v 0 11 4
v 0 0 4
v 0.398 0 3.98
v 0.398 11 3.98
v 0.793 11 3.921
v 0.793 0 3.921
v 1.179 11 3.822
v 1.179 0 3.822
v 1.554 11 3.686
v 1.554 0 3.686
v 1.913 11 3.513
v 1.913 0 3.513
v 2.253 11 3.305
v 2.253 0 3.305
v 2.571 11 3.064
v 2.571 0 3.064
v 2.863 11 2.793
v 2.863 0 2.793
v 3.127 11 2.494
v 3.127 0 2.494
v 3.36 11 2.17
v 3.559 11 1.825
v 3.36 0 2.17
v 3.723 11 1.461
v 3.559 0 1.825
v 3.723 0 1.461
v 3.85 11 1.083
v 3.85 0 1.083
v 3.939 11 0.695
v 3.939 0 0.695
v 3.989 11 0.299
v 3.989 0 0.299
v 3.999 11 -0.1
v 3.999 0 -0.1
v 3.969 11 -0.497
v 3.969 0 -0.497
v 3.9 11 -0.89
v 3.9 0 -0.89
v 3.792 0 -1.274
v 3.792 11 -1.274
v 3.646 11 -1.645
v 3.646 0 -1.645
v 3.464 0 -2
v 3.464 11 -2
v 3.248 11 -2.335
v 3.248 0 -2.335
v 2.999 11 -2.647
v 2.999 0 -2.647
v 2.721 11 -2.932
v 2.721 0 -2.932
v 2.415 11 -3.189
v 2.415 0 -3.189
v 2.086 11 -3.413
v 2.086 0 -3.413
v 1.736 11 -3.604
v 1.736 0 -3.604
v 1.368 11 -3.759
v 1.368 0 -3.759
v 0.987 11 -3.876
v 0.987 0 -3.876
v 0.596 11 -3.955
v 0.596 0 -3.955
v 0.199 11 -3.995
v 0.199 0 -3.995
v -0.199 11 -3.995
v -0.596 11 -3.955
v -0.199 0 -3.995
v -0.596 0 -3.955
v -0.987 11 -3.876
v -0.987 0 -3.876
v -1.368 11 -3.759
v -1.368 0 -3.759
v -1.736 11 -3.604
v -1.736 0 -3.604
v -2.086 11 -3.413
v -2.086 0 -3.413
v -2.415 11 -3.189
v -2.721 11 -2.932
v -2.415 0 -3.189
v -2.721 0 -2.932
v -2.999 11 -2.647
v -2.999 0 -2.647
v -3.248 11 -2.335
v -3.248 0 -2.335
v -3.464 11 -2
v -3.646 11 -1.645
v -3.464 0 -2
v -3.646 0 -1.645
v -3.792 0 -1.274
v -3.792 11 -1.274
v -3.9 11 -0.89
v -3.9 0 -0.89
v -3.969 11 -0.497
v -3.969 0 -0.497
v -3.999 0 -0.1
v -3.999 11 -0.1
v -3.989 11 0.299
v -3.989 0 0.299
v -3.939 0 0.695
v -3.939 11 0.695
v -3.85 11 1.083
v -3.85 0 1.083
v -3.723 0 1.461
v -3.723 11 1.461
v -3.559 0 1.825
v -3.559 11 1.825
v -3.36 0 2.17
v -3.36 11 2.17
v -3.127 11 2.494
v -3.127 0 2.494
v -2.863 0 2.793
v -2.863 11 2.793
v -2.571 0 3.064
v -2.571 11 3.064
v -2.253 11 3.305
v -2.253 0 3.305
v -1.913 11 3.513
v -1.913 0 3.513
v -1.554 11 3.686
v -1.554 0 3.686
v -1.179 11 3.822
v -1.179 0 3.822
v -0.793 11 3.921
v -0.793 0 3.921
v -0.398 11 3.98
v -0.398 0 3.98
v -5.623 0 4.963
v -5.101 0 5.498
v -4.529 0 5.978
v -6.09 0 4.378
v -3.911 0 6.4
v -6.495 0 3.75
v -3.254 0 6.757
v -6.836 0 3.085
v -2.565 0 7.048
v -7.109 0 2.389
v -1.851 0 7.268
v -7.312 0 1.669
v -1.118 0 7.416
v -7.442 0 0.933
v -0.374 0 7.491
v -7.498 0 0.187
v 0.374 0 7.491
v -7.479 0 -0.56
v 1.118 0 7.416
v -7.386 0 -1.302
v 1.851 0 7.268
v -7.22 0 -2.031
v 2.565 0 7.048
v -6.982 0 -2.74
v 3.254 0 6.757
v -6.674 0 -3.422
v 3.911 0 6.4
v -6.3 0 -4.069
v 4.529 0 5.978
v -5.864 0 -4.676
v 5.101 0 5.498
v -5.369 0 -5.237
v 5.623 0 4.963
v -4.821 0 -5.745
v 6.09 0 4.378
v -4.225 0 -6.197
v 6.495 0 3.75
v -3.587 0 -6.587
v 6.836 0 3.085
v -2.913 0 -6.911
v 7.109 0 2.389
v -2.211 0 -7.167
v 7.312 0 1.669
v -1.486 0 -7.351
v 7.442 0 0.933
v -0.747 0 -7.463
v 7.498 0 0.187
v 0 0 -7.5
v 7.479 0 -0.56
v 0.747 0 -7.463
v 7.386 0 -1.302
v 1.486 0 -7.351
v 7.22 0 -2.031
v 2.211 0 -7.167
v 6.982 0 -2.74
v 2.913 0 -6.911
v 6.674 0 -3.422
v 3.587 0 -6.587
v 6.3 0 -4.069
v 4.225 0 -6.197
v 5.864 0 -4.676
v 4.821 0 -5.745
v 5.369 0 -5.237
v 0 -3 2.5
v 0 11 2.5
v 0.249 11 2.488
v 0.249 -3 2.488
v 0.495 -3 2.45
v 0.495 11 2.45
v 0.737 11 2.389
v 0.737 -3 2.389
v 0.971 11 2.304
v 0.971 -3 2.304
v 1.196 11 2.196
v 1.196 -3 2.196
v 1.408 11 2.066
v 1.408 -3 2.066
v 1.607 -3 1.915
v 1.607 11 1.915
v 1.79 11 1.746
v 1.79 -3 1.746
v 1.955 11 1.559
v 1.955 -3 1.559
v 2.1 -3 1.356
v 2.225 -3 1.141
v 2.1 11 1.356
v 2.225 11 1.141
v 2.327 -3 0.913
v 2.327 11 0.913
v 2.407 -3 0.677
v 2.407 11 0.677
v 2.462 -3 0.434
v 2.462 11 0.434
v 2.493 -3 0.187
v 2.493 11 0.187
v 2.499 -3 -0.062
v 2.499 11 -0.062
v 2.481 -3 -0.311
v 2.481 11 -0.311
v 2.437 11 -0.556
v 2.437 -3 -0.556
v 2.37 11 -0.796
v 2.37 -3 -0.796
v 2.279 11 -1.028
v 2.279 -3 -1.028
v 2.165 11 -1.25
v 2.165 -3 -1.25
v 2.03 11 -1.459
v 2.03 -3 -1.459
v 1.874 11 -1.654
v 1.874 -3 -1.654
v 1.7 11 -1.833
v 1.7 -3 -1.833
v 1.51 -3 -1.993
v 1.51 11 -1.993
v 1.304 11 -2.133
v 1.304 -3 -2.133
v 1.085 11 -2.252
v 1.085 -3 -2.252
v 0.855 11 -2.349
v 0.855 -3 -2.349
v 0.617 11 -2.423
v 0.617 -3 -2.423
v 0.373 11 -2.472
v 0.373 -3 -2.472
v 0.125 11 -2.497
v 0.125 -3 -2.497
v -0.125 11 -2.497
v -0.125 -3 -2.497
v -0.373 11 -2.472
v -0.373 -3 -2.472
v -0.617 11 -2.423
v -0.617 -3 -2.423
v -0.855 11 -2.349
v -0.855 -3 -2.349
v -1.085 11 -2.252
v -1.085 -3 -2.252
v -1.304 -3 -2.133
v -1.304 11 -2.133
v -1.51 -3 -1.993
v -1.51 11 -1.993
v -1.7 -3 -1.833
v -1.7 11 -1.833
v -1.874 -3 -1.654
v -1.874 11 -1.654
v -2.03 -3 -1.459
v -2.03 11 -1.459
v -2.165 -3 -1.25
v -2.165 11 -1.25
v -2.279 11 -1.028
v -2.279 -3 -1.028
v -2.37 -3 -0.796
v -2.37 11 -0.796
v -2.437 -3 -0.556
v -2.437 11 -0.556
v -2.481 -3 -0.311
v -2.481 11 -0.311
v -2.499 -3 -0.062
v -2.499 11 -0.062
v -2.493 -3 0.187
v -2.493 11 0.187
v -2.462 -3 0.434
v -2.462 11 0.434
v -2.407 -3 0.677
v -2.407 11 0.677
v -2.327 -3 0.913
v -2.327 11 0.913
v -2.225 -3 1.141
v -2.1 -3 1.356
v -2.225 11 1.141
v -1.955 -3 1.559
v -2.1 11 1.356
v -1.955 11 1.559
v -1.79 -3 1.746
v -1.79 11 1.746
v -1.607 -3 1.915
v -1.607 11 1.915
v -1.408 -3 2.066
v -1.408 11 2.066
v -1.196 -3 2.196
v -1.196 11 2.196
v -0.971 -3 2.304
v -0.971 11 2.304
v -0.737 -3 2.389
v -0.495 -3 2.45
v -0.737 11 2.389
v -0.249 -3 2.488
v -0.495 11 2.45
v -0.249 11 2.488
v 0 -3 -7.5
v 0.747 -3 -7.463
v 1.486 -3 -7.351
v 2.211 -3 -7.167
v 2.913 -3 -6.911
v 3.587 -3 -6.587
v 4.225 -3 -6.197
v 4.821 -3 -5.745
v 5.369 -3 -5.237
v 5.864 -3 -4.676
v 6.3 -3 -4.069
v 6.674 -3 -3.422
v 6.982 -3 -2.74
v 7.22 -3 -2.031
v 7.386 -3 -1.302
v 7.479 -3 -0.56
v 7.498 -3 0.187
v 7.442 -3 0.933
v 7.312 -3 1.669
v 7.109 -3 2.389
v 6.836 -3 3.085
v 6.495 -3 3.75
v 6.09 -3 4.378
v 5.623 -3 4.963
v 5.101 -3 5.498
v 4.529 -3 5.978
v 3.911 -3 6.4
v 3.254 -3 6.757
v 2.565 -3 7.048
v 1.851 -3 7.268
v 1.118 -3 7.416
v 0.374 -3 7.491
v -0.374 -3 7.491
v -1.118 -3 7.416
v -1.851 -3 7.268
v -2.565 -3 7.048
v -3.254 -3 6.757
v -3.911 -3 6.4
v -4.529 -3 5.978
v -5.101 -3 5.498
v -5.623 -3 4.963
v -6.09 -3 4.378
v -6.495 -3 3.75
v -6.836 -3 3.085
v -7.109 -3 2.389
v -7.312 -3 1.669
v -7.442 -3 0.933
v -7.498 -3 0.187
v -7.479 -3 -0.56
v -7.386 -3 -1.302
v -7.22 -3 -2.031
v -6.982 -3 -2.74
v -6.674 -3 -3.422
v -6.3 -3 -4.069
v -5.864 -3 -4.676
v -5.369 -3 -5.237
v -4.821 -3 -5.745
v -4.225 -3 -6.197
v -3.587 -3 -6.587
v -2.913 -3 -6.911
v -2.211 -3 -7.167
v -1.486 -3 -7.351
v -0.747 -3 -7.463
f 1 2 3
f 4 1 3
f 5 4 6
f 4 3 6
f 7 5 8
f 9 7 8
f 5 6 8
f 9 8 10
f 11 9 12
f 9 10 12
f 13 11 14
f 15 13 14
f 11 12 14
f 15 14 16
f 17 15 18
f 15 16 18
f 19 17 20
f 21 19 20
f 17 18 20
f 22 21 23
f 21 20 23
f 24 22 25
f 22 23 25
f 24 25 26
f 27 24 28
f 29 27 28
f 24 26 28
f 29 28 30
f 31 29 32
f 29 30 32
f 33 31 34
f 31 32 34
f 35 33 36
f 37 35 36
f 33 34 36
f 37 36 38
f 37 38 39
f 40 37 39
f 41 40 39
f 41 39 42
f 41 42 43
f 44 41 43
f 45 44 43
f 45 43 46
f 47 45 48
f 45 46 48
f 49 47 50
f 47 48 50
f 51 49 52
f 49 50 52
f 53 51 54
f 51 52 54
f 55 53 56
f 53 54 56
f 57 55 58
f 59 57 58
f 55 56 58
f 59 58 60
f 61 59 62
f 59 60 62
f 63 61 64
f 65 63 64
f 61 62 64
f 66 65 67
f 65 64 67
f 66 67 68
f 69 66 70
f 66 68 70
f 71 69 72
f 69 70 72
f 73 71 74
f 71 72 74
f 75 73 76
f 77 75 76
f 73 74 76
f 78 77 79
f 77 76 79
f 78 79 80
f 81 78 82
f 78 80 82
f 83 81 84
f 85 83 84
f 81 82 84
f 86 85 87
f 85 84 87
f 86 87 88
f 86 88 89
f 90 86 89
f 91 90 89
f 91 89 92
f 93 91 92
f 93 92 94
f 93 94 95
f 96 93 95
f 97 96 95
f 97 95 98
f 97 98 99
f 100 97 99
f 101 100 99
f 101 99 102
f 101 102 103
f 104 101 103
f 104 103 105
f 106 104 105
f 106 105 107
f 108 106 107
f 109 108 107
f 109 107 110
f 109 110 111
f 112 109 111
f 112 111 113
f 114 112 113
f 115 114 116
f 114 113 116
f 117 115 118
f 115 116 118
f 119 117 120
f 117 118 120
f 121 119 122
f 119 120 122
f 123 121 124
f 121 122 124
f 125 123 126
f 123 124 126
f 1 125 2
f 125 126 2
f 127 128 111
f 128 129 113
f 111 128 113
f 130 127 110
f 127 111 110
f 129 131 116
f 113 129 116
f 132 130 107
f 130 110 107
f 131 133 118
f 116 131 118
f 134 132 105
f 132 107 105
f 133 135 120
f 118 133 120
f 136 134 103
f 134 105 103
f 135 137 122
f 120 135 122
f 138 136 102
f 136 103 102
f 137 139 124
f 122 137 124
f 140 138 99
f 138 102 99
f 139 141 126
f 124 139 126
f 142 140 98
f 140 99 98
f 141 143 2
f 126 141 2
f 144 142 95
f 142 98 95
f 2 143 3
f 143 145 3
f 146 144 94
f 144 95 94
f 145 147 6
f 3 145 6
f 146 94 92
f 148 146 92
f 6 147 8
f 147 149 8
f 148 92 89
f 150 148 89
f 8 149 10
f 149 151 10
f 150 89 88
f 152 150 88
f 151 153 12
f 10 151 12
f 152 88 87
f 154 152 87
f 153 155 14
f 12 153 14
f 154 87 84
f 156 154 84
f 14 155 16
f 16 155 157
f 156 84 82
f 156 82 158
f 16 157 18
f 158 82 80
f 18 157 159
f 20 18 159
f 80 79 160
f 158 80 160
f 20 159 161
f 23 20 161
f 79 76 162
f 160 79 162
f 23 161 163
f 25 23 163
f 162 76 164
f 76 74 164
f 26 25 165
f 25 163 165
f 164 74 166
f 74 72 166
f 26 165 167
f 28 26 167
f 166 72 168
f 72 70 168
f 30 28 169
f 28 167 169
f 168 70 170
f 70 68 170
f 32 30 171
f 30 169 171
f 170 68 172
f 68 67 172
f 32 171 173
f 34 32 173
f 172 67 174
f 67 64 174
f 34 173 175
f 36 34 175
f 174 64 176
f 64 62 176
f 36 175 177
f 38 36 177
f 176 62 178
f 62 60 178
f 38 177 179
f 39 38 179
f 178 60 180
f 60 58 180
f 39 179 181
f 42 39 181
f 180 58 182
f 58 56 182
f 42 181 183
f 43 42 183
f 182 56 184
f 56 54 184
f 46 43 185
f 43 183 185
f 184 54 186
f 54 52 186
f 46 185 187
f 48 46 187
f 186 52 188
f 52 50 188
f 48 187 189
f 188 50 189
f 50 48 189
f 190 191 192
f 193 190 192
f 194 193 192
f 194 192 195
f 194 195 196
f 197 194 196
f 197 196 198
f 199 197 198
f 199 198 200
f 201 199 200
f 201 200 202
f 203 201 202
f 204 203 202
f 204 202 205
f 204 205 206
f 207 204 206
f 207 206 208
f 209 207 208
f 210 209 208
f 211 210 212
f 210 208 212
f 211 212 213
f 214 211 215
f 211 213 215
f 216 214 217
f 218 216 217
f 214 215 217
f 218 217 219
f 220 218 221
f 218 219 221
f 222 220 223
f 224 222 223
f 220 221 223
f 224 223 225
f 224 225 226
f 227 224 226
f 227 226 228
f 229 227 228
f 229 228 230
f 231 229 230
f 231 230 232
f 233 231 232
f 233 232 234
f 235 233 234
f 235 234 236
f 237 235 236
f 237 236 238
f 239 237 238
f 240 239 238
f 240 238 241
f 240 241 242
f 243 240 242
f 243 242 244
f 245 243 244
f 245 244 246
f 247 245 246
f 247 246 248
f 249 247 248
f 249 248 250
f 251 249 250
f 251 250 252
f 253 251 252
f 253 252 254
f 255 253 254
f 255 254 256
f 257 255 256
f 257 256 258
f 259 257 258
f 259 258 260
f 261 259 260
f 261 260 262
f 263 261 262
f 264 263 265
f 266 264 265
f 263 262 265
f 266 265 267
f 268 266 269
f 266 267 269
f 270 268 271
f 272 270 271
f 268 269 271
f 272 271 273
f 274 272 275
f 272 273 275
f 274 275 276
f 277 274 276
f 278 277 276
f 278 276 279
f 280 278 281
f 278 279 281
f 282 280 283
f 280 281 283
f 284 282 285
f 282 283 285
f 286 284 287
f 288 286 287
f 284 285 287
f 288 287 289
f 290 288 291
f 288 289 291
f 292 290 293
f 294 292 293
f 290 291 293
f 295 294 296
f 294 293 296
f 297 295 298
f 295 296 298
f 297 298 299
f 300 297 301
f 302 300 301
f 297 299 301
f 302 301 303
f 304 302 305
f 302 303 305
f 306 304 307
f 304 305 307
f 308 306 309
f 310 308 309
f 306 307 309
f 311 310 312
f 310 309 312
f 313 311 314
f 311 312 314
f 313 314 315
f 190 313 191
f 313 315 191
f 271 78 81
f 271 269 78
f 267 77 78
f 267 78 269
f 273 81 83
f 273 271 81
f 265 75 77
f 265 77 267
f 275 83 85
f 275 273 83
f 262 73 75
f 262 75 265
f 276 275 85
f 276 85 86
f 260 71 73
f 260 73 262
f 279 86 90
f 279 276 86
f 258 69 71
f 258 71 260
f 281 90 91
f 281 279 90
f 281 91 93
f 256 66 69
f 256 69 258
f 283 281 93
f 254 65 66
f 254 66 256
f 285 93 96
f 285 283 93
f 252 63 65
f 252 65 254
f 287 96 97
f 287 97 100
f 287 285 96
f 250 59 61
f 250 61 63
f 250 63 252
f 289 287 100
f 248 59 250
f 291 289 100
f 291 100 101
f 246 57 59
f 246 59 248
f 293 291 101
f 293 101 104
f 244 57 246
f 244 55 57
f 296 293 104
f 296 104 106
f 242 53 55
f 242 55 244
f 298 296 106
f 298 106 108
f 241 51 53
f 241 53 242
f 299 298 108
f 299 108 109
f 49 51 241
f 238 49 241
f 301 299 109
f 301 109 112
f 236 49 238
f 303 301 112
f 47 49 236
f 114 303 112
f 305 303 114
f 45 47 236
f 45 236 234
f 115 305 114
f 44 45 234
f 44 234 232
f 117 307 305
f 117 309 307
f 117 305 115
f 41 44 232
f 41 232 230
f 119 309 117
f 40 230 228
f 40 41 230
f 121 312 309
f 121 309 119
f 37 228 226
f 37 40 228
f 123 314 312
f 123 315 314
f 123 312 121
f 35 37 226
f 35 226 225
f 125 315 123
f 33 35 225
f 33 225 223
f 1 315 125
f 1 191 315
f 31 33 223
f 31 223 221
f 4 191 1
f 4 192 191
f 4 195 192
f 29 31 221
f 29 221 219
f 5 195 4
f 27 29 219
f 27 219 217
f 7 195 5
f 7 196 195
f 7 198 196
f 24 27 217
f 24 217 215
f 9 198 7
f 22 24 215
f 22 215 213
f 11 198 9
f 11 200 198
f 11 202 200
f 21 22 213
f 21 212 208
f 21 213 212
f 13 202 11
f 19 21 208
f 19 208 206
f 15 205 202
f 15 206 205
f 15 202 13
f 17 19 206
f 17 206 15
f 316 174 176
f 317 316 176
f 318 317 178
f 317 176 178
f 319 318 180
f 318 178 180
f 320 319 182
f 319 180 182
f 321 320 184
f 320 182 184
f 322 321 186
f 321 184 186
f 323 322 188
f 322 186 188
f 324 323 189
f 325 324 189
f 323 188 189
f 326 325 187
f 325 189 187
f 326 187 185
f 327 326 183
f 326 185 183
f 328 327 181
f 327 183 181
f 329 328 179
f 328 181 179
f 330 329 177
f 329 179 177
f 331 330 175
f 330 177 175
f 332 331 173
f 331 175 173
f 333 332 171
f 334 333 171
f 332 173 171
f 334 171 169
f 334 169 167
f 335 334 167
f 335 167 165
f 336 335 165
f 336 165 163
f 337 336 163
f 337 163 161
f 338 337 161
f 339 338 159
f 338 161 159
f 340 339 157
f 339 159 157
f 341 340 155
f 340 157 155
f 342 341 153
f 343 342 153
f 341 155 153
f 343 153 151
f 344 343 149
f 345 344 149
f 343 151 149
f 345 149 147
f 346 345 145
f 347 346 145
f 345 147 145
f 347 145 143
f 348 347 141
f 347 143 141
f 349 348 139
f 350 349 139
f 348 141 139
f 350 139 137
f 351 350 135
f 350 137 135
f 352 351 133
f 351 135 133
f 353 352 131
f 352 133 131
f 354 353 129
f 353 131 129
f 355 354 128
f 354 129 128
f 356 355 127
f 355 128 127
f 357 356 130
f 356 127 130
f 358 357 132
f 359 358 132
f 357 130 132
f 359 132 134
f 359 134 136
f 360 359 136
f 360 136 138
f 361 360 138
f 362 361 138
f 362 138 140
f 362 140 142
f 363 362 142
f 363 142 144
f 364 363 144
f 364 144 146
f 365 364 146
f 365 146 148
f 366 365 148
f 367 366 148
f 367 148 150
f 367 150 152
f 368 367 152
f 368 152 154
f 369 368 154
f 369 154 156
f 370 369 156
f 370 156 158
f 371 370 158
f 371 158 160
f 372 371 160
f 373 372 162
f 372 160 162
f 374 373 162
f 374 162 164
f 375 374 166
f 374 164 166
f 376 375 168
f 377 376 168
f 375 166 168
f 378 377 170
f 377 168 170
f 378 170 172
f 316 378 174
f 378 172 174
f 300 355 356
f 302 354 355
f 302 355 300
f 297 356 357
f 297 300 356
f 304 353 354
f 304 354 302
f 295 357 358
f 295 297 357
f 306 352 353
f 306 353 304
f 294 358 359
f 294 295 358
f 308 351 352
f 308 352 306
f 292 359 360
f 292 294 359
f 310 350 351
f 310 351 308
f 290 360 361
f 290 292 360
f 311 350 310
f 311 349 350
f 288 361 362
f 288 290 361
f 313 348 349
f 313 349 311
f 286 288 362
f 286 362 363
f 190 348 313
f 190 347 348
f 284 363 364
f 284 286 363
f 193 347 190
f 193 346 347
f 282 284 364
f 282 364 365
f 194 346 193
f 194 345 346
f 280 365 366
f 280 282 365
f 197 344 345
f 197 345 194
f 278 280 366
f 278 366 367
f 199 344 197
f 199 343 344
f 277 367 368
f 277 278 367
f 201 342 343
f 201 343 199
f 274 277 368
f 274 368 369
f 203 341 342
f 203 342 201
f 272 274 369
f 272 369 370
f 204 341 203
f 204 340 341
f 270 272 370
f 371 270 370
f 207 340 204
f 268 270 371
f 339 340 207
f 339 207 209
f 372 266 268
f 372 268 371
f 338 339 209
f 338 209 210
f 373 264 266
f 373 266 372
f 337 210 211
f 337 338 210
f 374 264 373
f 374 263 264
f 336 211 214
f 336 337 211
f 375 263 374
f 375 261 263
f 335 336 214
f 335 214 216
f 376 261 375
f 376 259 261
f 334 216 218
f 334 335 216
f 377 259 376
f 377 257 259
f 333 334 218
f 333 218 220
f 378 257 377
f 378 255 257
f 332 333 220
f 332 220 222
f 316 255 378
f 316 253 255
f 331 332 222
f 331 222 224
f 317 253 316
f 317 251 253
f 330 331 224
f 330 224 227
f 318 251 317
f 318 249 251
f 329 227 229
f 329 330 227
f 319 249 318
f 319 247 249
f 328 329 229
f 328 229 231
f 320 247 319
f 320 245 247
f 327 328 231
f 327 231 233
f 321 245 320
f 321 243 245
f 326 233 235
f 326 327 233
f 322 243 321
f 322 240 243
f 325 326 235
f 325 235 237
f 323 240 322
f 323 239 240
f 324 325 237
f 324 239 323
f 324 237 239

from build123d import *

# Parameters (mm, degrees)
ESBO_O1_R                = 4
RESSALTO_EXTRUS_O1_DEPTH = 11
ESBO_O3_R                = 7.5
RESSALTO_EXTRUS_O3_DEPTH = 3
ESBO_O6_R                = 2.5
CORTE_EXTRUS_O1_DEPTH    = 18.56416807


with BuildPart() as part:
    # Esboço1 → Ressalto-extrusão1 (new body)
    with BuildSketch(Plane(origin=(0, 0, 0), x_dir=(1, 0, 0), z_dir=(0, 1, 0))):
        with Locations(Location((0, 0, 0), (0, 0, 270))):
            Circle(ESBO_O1_R)
    extrude(amount=RESSALTO_EXTRUS_O1_DEPTH)

    # Esboço3 → Ressalto-extrusão3 (add)
    with BuildSketch(Plane.XZ):
        with Locations(Location((0, 0, 0), (0, 0, 270))):
            Circle(ESBO_O3_R)
    extrude(amount=RESSALTO_EXTRUS_O3_DEPTH)

    # Esboço6 → Corte-extrusão1 (cut, through all)
    with BuildSketch(Plane(origin=(0, 11, 0), x_dir=(1, 0, 0), z_dir=(0, 1, 0))):
        with Locations(Location((0, 0, 0), (0, 0, 270))):
            Circle(ESBO_O6_R)
    extrude(amount=-CORTE_EXTRUS_O1_DEPTH, mode=Mode.SUBTRACT)


solid = part.part
